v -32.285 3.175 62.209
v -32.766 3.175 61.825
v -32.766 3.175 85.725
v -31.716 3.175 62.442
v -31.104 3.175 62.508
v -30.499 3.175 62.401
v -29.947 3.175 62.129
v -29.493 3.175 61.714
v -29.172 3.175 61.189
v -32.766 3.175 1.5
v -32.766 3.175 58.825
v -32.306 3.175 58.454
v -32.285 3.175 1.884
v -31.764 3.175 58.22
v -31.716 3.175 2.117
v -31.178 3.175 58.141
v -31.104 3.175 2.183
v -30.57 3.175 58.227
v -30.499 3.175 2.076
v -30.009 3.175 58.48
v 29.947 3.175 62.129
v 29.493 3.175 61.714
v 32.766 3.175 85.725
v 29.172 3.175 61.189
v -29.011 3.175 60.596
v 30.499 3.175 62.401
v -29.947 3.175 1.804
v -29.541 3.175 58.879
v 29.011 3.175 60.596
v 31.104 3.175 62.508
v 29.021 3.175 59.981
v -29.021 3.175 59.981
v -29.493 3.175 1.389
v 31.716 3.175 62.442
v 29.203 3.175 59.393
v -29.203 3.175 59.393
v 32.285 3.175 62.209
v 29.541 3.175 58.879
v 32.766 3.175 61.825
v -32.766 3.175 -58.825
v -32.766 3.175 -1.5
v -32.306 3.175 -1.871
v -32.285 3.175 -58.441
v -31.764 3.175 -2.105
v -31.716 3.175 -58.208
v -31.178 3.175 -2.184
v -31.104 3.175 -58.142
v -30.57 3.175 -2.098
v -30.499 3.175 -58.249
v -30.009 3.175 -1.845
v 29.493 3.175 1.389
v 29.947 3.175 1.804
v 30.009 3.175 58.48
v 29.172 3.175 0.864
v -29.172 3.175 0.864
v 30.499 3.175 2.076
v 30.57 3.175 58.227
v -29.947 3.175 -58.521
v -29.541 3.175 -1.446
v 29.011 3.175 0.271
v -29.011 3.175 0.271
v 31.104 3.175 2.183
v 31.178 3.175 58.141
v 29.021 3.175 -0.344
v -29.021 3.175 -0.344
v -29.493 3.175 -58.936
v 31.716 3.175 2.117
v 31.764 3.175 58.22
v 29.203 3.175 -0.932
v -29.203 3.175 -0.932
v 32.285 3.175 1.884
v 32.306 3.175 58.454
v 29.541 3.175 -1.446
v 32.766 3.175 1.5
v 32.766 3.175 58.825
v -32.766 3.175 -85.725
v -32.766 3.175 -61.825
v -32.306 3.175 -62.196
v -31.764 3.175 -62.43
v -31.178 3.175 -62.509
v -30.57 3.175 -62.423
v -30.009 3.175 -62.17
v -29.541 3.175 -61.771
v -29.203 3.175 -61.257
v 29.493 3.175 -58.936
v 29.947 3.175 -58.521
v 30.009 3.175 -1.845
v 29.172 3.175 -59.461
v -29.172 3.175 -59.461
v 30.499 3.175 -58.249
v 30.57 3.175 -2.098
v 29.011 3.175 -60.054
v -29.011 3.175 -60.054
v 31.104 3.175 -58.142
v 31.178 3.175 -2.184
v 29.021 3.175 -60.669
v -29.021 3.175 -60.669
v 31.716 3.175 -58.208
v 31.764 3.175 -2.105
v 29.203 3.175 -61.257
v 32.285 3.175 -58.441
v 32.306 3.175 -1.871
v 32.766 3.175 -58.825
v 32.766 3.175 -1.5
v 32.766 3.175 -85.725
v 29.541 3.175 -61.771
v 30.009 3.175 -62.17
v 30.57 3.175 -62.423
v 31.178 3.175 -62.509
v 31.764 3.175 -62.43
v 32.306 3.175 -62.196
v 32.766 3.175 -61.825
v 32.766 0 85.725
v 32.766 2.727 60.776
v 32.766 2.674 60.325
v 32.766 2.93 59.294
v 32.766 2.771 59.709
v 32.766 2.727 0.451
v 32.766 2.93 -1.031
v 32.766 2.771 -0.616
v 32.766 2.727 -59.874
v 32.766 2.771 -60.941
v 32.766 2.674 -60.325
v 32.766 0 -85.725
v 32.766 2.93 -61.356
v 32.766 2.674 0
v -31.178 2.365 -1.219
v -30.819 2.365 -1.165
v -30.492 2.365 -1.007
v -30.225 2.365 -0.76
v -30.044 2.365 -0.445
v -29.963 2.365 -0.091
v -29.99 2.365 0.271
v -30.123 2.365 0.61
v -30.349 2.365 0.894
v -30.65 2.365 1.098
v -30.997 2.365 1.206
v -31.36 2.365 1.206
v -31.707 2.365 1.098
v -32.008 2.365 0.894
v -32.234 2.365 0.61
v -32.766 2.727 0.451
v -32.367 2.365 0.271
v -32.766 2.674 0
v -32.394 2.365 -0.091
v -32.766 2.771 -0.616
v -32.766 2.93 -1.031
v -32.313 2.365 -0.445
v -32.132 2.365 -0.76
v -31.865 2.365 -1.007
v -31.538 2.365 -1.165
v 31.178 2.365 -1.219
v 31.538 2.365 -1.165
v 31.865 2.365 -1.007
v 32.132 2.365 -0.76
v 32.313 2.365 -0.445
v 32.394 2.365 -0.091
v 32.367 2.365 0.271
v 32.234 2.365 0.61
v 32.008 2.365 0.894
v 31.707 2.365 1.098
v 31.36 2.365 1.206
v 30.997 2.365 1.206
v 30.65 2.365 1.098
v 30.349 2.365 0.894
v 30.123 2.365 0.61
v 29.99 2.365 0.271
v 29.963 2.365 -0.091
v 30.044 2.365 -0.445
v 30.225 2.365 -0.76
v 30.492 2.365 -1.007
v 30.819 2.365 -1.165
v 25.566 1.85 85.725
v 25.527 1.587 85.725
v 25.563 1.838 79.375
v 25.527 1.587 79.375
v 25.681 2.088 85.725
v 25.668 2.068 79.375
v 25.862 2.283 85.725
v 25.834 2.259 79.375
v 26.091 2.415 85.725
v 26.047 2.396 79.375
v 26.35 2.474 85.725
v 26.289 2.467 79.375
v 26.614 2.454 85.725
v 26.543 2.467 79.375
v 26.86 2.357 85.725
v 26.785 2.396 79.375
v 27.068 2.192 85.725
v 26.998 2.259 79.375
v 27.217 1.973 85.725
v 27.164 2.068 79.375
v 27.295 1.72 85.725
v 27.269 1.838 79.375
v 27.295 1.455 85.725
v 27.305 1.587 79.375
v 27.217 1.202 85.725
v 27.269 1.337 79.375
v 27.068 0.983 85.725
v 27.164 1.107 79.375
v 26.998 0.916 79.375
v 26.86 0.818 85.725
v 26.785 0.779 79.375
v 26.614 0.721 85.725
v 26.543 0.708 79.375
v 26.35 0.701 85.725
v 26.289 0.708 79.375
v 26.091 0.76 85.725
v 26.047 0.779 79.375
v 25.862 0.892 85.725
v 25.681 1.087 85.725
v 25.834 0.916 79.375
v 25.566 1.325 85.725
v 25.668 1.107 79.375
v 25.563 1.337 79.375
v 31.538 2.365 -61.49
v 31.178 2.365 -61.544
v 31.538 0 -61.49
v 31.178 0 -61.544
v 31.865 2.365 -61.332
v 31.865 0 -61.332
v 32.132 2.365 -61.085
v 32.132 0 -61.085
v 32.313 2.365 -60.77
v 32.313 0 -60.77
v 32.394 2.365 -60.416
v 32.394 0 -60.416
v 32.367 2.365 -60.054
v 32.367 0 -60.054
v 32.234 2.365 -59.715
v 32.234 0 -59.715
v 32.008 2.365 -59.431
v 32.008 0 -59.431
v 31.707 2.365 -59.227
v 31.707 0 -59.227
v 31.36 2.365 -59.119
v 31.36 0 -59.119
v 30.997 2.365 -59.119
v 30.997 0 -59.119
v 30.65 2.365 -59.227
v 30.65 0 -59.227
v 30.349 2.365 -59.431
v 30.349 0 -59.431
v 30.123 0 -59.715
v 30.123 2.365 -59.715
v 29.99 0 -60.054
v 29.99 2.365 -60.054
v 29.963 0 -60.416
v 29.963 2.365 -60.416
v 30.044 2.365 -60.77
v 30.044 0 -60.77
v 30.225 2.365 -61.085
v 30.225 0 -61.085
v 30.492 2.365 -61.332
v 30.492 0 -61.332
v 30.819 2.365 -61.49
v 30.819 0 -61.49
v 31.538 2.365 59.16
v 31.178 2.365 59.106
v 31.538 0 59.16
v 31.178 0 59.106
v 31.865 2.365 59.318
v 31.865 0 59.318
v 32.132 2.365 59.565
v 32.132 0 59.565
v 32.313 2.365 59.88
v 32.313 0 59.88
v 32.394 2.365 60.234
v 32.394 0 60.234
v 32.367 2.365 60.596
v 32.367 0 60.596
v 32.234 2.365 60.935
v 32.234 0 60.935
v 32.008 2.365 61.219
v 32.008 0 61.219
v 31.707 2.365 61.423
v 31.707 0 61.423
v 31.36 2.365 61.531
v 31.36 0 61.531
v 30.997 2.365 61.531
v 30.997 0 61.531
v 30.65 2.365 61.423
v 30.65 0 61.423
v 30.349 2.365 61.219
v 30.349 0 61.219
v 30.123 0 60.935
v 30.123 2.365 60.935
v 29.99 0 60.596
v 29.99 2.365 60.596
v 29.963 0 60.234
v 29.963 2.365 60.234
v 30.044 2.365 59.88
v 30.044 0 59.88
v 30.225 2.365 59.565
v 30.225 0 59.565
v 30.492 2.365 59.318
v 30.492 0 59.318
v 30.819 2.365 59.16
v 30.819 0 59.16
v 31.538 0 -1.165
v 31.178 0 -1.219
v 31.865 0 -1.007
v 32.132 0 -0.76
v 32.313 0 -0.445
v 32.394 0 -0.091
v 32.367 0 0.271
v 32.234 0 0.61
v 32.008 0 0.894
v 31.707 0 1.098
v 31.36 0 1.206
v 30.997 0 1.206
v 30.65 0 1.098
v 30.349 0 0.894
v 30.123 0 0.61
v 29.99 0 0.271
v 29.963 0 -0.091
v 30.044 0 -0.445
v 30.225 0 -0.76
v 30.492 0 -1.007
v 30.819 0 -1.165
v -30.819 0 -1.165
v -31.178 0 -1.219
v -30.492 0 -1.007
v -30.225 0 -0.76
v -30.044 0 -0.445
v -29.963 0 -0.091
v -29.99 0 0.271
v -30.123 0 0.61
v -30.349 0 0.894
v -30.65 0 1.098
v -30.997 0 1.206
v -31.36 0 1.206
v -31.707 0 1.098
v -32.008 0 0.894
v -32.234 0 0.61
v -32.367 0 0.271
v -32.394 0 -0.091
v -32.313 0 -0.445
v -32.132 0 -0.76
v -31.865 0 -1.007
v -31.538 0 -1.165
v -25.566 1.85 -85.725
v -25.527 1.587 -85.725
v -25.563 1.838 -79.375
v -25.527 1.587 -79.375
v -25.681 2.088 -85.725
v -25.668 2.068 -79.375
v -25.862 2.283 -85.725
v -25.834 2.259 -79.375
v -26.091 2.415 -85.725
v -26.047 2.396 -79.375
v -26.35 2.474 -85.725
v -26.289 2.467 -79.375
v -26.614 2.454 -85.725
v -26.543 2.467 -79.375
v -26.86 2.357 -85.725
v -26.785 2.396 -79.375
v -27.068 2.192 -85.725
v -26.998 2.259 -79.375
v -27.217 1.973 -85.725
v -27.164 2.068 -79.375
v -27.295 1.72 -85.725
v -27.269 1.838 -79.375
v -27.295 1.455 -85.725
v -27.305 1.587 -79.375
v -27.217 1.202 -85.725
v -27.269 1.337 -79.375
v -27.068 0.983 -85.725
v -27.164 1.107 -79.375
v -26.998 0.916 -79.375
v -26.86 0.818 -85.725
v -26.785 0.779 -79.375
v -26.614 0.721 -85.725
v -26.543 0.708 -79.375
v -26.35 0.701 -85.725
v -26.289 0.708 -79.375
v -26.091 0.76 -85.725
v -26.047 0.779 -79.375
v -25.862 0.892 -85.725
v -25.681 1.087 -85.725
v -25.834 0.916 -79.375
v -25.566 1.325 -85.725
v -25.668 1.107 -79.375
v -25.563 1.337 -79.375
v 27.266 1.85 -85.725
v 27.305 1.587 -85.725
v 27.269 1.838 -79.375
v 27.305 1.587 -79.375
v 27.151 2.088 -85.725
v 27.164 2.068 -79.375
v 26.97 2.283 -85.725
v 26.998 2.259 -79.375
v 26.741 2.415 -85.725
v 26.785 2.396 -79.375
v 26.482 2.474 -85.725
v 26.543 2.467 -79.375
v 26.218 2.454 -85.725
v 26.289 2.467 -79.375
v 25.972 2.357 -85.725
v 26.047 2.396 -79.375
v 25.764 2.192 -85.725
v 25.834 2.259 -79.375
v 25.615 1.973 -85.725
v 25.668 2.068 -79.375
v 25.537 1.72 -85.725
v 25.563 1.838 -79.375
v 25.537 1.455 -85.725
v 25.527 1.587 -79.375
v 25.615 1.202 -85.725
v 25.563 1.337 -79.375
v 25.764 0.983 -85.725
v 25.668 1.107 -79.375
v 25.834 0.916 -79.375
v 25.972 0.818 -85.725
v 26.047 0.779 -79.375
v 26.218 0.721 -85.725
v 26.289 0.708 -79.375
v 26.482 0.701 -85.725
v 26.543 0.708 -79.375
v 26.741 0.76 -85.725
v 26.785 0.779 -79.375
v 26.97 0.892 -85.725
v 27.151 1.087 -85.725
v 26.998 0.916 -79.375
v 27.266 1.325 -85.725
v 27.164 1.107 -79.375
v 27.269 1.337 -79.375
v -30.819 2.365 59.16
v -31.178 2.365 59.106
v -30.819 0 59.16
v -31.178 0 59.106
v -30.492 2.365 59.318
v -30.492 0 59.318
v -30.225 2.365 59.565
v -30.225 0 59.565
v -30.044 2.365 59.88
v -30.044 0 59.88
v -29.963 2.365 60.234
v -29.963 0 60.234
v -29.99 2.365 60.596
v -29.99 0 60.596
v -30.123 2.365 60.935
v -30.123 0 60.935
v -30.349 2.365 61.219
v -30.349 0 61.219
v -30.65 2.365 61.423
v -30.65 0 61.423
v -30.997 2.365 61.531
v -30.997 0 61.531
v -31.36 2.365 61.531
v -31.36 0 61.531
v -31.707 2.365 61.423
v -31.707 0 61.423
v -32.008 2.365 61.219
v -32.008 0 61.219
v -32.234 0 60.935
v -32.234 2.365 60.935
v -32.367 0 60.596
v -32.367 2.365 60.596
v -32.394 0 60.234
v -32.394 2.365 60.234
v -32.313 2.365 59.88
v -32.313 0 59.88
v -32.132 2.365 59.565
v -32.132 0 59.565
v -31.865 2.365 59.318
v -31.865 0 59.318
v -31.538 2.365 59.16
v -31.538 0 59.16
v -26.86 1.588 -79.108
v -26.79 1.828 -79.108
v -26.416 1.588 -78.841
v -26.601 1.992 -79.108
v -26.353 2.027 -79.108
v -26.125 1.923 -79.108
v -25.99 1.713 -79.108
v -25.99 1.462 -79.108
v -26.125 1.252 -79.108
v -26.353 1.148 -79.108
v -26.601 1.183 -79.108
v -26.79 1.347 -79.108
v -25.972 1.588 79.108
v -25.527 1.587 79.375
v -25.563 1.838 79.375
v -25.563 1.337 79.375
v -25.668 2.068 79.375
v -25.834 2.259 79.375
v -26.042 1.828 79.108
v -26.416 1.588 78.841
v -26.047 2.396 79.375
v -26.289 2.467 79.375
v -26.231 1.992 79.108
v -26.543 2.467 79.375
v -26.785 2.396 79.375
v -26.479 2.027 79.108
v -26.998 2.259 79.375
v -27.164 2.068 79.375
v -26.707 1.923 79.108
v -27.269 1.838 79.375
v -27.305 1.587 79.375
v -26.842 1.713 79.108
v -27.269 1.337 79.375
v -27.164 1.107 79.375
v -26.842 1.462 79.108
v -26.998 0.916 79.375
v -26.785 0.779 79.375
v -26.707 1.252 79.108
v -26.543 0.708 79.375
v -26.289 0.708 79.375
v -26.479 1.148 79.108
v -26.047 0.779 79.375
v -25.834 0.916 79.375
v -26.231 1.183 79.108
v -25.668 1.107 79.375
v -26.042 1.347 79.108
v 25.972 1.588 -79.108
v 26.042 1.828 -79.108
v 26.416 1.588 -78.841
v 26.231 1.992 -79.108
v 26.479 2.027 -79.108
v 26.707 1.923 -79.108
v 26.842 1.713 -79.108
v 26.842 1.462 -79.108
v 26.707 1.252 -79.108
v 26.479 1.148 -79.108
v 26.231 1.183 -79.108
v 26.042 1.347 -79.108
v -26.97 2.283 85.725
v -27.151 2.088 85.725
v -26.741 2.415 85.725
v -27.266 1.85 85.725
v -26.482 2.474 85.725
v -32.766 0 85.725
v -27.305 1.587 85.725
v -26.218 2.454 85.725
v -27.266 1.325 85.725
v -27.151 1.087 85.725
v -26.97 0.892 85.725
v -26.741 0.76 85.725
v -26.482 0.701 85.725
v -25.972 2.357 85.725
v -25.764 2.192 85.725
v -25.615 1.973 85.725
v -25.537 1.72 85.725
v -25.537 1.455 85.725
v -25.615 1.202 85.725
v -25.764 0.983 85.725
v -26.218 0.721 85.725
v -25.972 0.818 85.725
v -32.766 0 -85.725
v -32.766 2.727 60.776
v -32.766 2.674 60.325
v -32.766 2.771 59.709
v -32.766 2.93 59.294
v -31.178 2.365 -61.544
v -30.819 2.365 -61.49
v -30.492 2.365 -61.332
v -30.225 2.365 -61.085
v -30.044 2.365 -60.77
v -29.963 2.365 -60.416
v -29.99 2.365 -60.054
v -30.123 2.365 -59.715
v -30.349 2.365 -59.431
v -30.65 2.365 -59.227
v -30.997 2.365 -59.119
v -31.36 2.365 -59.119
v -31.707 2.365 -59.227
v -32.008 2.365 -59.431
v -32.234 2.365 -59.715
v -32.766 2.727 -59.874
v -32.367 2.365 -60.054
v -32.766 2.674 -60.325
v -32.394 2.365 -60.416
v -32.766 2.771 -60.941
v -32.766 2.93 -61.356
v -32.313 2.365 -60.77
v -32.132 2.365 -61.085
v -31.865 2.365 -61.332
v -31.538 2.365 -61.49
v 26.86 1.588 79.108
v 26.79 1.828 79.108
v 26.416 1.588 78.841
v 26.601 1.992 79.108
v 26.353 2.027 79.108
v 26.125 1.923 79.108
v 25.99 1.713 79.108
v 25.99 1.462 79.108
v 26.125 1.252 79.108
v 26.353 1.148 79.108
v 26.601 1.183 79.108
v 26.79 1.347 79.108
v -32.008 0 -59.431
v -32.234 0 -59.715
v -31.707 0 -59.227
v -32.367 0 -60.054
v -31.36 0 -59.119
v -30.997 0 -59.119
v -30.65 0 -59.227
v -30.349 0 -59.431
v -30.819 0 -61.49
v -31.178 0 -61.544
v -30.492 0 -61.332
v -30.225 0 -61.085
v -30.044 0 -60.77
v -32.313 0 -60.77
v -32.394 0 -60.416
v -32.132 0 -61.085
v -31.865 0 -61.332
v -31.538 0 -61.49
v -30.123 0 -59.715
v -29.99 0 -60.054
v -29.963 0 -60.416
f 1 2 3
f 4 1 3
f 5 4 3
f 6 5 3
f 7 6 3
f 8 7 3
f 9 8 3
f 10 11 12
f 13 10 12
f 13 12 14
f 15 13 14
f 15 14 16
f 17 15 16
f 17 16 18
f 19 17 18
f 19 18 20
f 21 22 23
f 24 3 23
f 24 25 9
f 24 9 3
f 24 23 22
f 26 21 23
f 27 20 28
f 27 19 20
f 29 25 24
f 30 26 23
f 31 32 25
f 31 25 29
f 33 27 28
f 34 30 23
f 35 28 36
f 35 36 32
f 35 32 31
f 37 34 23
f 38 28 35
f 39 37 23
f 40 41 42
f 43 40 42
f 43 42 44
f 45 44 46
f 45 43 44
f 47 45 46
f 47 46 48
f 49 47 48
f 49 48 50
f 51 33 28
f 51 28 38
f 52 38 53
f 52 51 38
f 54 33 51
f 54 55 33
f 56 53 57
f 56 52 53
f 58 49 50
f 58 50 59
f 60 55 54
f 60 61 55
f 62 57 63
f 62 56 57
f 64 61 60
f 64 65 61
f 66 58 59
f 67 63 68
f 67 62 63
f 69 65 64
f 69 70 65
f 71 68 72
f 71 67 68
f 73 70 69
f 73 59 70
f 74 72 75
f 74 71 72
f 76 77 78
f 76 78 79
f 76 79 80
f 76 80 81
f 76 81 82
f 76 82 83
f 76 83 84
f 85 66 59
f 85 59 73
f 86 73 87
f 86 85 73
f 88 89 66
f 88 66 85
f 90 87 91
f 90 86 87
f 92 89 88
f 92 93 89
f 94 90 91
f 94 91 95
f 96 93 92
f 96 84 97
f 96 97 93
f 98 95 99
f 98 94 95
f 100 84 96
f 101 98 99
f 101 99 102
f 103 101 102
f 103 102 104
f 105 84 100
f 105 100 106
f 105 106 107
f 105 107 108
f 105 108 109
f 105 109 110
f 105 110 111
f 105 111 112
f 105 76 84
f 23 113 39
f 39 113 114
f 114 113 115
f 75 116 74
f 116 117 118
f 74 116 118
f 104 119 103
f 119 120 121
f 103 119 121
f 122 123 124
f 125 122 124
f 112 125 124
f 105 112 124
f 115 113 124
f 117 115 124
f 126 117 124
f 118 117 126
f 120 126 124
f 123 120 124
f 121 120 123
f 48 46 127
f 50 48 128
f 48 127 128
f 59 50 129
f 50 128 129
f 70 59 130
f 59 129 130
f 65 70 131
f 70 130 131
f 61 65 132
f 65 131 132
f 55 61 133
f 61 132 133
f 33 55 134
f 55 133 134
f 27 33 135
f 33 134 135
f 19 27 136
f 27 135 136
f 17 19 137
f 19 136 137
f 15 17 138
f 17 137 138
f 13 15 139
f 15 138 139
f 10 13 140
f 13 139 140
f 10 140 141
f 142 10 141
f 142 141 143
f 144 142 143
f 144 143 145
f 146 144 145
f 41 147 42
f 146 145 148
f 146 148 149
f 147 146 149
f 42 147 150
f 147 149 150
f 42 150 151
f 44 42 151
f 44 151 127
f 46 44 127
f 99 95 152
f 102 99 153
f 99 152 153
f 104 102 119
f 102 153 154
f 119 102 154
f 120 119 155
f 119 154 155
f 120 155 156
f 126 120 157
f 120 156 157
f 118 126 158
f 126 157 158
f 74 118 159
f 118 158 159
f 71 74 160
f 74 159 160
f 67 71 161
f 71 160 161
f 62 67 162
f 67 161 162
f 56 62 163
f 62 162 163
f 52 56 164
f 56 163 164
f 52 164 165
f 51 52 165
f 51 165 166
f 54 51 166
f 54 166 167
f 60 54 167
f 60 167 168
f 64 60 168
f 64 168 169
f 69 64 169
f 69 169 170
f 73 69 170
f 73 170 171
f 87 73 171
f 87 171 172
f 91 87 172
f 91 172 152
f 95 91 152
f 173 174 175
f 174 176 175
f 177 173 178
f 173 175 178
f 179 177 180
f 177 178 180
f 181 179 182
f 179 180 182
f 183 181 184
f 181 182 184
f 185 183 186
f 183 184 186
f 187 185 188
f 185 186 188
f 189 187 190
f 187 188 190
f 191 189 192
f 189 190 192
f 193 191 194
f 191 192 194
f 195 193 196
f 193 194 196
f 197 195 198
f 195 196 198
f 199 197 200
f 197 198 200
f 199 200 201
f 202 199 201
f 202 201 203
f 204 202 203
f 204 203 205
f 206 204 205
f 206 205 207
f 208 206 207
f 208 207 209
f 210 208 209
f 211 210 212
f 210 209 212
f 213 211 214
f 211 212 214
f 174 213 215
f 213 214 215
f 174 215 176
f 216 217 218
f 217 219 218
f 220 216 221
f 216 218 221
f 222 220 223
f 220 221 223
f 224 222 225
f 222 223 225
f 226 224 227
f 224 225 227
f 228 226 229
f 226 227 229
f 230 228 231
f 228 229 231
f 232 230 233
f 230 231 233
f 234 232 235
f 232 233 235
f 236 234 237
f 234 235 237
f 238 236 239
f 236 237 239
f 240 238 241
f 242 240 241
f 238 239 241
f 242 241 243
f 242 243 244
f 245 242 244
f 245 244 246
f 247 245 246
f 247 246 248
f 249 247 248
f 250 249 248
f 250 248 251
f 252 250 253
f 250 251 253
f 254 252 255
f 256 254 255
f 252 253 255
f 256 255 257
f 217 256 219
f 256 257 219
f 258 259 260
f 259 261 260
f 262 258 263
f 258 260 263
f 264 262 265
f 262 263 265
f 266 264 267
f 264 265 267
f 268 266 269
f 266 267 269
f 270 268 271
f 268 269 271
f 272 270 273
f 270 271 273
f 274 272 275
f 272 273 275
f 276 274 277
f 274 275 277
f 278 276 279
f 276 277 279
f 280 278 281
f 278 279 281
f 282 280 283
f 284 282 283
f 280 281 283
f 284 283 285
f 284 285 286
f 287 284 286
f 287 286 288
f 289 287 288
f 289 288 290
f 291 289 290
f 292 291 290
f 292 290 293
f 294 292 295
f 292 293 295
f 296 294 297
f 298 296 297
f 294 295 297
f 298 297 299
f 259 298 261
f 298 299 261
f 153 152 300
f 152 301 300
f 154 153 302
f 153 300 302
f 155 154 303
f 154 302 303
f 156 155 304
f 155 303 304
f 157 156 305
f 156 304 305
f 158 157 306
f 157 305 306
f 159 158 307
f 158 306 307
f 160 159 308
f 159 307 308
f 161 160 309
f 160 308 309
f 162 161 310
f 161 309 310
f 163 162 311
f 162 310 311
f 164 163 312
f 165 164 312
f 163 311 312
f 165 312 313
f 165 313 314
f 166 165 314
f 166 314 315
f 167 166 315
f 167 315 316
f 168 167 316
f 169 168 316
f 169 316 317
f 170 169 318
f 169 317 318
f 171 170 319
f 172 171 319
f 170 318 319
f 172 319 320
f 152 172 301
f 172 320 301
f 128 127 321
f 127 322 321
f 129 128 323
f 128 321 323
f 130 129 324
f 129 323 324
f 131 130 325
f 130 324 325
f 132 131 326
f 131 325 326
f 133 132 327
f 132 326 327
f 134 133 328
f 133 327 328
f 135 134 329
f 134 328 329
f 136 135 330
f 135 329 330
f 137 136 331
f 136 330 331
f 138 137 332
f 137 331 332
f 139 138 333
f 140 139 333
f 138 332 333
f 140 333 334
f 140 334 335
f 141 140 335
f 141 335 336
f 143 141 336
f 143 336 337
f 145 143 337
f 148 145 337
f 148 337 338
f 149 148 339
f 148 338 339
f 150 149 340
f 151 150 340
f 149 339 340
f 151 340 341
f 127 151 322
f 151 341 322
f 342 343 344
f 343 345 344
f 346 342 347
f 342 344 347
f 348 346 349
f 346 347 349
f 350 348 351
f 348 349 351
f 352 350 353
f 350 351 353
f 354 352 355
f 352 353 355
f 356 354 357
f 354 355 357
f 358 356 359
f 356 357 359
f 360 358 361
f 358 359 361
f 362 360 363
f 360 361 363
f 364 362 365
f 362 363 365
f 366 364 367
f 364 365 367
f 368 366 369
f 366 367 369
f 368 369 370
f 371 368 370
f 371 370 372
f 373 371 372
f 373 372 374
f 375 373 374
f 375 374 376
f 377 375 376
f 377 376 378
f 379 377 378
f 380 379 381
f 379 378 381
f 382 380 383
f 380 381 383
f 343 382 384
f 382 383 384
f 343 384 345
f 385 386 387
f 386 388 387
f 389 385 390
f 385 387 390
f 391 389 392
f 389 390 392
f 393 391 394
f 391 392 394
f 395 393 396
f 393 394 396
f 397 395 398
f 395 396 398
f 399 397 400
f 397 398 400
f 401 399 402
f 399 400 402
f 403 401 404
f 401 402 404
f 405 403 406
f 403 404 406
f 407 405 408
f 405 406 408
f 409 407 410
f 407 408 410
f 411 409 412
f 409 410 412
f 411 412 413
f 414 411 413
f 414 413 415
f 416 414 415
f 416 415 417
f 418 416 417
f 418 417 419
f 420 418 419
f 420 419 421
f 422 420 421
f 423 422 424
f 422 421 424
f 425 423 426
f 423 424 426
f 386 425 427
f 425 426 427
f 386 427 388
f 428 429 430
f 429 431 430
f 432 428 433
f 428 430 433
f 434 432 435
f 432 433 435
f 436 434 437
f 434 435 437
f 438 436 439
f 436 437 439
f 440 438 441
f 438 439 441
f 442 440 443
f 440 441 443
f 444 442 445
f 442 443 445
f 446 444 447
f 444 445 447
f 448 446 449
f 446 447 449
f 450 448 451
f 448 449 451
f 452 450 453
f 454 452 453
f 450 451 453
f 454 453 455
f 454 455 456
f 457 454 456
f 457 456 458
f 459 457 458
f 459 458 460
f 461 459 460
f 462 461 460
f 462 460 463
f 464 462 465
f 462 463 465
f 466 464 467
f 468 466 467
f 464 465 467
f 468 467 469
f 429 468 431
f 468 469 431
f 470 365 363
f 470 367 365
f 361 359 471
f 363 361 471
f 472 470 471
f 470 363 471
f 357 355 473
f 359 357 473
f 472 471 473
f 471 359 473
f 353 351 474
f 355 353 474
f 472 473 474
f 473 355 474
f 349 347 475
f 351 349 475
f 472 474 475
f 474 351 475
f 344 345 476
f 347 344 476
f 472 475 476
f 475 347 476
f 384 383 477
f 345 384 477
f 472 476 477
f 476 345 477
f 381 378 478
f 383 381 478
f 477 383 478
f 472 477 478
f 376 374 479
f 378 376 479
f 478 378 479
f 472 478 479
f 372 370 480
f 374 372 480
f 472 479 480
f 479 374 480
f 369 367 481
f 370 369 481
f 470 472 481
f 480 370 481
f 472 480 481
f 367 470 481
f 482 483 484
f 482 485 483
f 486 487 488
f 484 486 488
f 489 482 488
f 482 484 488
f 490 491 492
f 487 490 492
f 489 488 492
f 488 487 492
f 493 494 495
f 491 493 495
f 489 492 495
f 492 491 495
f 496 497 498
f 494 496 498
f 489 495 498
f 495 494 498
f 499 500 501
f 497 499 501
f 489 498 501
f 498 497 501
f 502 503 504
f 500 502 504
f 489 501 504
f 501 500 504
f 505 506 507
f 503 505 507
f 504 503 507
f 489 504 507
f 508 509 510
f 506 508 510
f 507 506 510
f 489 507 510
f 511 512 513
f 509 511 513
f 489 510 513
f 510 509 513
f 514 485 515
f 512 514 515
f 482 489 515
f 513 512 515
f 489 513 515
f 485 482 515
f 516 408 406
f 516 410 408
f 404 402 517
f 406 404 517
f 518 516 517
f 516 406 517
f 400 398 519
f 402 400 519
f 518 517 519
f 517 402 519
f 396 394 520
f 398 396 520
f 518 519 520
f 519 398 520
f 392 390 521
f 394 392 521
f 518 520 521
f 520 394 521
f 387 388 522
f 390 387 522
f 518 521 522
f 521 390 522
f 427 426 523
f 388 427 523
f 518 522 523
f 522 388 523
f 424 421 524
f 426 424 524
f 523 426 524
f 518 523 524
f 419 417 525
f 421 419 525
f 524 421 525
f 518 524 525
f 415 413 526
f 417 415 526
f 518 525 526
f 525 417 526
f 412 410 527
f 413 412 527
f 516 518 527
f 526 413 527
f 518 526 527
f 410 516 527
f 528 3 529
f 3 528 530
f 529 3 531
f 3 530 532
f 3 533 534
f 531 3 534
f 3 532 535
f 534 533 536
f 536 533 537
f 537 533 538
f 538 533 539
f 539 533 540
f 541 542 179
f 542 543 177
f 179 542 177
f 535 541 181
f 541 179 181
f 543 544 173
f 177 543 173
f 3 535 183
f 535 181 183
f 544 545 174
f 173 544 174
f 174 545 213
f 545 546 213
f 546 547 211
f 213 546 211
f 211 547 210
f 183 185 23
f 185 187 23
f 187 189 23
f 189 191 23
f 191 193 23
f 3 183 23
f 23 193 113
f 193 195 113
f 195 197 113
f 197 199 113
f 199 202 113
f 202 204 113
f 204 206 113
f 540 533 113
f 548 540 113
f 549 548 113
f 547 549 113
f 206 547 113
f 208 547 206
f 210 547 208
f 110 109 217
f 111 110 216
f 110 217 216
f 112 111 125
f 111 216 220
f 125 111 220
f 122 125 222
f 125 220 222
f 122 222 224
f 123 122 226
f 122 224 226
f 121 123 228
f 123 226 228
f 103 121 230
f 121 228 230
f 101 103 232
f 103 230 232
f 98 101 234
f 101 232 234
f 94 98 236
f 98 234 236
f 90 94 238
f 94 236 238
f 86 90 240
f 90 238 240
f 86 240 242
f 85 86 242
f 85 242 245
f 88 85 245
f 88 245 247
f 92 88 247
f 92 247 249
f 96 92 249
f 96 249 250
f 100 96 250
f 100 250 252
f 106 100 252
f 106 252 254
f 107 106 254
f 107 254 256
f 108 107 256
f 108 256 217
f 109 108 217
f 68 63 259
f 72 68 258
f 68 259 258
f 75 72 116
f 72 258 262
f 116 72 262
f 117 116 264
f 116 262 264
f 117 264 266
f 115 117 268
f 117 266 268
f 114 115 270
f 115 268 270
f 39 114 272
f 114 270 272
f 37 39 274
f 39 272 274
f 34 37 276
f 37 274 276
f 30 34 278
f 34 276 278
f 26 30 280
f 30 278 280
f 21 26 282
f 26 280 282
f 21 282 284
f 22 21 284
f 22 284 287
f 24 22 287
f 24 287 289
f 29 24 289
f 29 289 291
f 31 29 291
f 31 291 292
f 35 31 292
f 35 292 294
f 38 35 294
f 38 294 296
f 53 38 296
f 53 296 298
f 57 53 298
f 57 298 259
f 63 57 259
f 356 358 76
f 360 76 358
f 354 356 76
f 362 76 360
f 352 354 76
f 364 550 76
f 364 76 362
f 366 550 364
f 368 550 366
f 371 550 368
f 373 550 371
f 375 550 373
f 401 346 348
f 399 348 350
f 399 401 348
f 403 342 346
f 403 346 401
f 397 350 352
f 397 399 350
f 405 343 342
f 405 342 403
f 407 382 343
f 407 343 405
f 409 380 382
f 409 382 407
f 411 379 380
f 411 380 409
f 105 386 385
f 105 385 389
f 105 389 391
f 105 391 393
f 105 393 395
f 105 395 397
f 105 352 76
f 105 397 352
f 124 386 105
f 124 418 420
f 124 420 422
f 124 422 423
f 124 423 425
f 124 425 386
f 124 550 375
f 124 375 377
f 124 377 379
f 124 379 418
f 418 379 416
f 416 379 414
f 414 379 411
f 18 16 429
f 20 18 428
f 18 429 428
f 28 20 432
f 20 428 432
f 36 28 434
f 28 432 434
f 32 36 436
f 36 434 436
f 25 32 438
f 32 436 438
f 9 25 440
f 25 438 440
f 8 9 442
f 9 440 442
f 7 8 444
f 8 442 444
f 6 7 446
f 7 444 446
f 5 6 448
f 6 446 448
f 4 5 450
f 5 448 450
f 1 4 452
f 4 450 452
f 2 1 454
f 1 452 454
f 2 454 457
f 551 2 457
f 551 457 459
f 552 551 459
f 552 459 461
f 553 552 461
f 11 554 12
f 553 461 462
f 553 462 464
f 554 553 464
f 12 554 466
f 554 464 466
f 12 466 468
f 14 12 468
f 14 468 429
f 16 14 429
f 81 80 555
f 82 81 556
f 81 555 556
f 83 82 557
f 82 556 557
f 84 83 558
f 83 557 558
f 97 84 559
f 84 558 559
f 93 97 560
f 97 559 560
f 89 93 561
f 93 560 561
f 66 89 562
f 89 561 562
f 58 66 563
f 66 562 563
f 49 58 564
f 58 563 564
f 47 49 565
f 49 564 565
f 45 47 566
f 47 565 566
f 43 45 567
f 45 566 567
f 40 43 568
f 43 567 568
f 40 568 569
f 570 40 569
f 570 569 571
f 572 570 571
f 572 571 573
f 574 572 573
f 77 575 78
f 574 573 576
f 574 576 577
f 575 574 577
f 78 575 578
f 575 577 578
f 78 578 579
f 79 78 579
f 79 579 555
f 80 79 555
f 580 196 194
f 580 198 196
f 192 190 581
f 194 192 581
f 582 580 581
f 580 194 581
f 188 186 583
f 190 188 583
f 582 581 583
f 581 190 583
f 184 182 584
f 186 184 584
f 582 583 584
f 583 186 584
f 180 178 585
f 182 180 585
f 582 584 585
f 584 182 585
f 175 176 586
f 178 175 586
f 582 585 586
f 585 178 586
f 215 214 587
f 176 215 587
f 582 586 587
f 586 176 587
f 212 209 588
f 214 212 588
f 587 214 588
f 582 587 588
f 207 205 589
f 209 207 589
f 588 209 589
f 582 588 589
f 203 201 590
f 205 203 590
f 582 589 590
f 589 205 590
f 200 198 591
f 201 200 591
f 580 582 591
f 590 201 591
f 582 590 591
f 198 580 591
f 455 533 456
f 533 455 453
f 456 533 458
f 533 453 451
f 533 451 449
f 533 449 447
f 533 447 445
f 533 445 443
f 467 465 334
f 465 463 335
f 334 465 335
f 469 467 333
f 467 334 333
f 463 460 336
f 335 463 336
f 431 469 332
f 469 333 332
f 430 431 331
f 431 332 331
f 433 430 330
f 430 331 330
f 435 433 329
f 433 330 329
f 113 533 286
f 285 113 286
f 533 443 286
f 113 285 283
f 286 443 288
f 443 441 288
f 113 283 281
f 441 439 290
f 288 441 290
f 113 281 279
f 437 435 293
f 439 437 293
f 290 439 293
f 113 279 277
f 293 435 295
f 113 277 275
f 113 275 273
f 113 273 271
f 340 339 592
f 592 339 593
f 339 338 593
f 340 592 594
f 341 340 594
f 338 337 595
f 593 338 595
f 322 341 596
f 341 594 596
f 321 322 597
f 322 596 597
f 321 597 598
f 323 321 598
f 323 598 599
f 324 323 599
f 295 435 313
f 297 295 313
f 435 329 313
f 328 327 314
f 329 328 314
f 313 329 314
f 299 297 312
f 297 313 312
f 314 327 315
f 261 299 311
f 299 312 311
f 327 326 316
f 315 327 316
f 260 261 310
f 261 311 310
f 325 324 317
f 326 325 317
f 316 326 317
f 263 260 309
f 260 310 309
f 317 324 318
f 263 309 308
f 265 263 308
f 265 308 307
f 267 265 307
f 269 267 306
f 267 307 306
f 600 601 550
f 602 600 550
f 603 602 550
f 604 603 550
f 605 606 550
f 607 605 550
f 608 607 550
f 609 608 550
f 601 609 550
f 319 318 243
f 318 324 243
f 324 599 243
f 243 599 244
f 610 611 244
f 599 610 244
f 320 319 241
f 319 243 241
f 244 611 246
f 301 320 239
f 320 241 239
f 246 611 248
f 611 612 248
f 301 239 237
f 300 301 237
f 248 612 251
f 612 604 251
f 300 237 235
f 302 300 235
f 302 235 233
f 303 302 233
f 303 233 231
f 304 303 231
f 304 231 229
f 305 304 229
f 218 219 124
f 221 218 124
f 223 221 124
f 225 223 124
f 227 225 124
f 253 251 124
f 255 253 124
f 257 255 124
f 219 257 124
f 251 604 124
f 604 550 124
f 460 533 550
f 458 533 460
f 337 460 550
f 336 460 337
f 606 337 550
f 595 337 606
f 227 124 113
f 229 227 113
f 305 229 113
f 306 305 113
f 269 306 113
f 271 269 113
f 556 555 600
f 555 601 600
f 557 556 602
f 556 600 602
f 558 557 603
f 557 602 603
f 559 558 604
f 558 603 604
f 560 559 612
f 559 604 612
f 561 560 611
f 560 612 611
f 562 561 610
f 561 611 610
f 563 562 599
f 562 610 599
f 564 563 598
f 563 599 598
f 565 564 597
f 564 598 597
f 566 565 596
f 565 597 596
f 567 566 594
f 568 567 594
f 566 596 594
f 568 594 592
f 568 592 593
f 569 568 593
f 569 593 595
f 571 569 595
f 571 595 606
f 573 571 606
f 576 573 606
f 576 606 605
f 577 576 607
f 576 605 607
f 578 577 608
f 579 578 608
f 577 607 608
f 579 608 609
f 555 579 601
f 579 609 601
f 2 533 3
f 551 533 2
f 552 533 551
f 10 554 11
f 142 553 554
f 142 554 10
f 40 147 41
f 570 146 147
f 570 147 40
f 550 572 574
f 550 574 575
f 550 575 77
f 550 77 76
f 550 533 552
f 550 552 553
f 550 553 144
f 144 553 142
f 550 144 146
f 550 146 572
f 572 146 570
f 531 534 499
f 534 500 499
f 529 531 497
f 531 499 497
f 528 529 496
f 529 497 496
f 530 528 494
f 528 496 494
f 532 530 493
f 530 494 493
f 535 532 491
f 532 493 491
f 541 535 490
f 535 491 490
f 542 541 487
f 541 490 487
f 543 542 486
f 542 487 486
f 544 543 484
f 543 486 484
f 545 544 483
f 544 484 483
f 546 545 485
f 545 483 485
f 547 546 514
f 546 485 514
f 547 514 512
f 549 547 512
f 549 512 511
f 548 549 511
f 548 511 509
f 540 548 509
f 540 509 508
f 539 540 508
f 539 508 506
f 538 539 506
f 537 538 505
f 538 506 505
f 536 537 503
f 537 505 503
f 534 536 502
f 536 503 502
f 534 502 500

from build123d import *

# Parameters (mm, degrees)
SKETCH1_W                                         = 65.532
SKETCH1_H                                         = 171.45
EXTRUDE1_DEPTH                                    = 3.175
TAP_DRILL_FOR_2_TAP1_D                            = 1.778
TAP_DRILL_FOR_2_TAP1_DEPTH                        = 6.35
TAP_DRILL_FOR_2_TAP1_TIP                          = 0.53416509
TAP_DRILL_FOR_2_TAP2_D                            = 1.778
TAP_DRILL_FOR_2_TAP2_DEPTH                        = 6.35
TAP_DRILL_FOR_2_TAP2_TIP                          = 0.53416509
CSK_FOR_2_FLAT_HEAD_MACHINE_SCREW_100_D           = 2.4384
CSK_FOR_2_FLAT_HEAD_MACHINE_SCREW_100_CSINK_D     = 4.3688
CSK_FOR_2_FLAT_HEAD_MACHINE_SCREW_100_CSINK_ANGLE = 100


with BuildPart() as part:
    # Sketch1 → Extrude1 (new body)
    with BuildSketch(Plane(origin=(0, 0, 0), x_dir=(1, 0, 0), z_dir=(0, 1, 0))):
        Rectangle(SKETCH1_W, SKETCH1_H)
    extrude(amount=EXTRUDE1_DEPTH)

    # Tap Drill for #2 Tap1
    with Locations(Plane(origin=(-26.416, 1.5875, 85.725), x_dir=(1, 0, 0), z_dir=(0, 0, 1))):
        with Locations((0, 0), (52.832, 0)):
            Hole(TAP_DRILL_FOR_2_TAP1_D / 2, depth=TAP_DRILL_FOR_2_TAP1_DEPTH)
            with Locations((0, 0, -(TAP_DRILL_FOR_2_TAP1_DEPTH + TAP_DRILL_FOR_2_TAP1_TIP / 2))):  # 118° drill point
                Cone(0, TAP_DRILL_FOR_2_TAP1_D / 2, TAP_DRILL_FOR_2_TAP1_TIP, mode=Mode.SUBTRACT)

    # Tap Drill for #2 Tap2
    with Locations(Plane(origin=(26.416, 1.5875, -85.725), x_dir=(-1, 0, 0), z_dir=(0, 0, -1))):
        with Locations((0, 0), (52.832, 0)):
            Hole(TAP_DRILL_FOR_2_TAP2_D / 2, depth=TAP_DRILL_FOR_2_TAP2_DEPTH)
            with Locations((0, 0, -(TAP_DRILL_FOR_2_TAP2_DEPTH + TAP_DRILL_FOR_2_TAP2_TIP / 2))):  # 118° drill point
                Cone(0, TAP_DRILL_FOR_2_TAP2_D / 2, TAP_DRILL_FOR_2_TAP2_TIP, mode=Mode.SUBTRACT)

    # CSK for #2 Flat Head Machine Screw (100)1 (through all)
    with Locations(Plane(origin=(-31.1785, 3.175, -60.325), x_dir=(0, 0, 1), z_dir=(0, 1, 0))):
        with Locations((0, 0), (60.325, 0), (120.65, 0), (120.65, 62.357), (60.325, 62.357), (0, 62.357)):
            CounterSinkHole(CSK_FOR_2_FLAT_HEAD_MACHINE_SCREW_100_D / 2, CSK_FOR_2_FLAT_HEAD_MACHINE_SCREW_100_CSINK_D / 2, counter_sink_angle=CSK_FOR_2_FLAT_HEAD_MACHINE_SCREW_100_CSINK_ANGLE)


solid = part.part
